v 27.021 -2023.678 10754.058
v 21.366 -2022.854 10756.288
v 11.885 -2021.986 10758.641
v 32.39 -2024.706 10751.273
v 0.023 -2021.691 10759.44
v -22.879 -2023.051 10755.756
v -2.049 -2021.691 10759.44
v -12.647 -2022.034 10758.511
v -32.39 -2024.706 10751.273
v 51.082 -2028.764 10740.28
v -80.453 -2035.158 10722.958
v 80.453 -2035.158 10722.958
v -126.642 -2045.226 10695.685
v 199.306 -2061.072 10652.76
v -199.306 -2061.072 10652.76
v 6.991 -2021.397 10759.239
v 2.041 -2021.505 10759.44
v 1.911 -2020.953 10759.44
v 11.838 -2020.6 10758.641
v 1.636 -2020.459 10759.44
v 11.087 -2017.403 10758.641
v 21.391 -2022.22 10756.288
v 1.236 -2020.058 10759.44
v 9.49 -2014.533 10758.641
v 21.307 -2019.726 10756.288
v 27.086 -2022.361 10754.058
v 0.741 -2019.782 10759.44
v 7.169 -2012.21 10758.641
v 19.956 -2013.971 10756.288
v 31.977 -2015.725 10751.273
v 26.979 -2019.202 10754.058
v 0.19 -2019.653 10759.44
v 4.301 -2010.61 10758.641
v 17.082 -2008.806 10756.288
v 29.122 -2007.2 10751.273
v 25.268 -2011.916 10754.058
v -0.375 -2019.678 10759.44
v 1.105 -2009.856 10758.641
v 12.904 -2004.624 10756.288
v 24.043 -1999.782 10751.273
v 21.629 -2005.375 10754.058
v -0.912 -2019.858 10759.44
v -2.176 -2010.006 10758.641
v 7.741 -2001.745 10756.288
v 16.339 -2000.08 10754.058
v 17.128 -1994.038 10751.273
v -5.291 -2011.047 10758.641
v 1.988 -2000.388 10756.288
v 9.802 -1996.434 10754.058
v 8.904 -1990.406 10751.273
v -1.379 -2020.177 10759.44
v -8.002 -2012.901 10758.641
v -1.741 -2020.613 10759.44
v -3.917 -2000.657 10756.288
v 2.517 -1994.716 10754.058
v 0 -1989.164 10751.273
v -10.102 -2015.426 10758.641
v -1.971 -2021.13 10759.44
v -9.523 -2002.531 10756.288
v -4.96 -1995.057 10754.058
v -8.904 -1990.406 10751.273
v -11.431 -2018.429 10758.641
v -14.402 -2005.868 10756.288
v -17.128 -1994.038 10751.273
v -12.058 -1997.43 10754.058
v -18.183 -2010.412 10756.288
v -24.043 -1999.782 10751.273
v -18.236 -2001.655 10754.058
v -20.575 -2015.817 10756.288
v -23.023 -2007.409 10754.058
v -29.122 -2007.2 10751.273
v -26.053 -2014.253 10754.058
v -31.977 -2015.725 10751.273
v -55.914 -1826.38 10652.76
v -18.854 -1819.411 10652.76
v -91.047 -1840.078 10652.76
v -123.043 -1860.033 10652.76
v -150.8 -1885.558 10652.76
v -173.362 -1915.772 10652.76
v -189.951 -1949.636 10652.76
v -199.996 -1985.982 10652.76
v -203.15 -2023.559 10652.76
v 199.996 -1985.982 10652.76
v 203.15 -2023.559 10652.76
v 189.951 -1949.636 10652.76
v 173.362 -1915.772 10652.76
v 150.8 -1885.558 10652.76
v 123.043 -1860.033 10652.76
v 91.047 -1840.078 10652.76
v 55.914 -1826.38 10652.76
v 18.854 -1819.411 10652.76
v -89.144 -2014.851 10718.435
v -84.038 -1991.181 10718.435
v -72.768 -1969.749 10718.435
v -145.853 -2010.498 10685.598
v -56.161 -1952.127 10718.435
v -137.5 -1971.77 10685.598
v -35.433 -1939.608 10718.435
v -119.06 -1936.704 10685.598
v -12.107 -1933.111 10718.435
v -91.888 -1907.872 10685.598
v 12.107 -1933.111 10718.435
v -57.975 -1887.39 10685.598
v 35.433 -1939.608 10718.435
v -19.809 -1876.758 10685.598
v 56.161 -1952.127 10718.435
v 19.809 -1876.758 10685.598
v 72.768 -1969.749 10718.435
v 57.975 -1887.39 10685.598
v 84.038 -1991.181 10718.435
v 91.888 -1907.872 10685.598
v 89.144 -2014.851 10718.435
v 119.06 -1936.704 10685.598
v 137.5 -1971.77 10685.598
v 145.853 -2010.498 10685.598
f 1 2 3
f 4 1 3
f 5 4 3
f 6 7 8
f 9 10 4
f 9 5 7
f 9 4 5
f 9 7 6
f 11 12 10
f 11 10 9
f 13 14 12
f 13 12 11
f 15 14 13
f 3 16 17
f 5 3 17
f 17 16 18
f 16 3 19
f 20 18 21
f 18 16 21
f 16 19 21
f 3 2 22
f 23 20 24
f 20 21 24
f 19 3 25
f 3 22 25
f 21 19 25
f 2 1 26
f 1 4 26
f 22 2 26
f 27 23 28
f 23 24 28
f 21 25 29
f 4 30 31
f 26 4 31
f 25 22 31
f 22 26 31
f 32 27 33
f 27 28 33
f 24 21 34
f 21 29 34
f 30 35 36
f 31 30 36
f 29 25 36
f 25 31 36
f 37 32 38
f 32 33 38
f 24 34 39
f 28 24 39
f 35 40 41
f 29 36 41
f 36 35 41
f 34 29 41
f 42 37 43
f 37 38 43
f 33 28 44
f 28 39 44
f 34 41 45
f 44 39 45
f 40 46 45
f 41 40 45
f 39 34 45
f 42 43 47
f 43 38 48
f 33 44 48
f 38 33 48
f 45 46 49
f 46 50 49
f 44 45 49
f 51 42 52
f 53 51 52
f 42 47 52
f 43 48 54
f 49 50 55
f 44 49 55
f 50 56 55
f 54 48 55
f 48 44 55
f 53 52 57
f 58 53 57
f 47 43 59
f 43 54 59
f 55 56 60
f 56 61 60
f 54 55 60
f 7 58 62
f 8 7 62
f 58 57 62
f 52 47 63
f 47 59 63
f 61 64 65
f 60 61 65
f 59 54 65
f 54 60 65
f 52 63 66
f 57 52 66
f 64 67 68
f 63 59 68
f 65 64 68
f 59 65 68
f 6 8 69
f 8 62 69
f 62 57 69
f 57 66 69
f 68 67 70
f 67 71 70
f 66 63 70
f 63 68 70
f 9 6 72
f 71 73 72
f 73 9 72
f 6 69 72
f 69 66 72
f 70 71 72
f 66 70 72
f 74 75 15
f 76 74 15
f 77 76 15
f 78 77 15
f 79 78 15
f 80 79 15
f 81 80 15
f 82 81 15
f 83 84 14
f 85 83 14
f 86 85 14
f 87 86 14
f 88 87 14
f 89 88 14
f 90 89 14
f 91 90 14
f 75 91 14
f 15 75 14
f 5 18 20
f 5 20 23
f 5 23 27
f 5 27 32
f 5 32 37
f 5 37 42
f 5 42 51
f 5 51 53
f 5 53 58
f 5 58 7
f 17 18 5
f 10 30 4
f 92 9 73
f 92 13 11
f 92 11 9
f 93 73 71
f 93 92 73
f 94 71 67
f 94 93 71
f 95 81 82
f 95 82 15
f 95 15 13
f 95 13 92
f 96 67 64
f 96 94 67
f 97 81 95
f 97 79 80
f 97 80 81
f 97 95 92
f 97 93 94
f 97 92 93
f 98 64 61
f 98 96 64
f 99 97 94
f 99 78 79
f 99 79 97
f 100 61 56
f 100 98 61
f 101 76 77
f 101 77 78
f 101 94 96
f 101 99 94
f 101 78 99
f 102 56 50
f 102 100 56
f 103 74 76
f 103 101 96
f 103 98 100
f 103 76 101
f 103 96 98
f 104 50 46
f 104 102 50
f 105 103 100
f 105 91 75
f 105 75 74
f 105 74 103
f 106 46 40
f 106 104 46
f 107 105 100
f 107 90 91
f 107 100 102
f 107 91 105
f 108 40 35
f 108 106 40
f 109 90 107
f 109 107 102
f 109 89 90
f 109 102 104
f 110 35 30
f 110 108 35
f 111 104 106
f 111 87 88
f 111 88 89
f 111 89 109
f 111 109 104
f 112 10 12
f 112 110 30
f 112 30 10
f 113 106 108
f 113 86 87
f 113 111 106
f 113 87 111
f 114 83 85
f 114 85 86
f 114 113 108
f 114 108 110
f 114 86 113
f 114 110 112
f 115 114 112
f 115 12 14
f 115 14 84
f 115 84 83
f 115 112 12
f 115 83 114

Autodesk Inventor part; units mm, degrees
ref_plane "YZ Plane" through (0, 0, 0) normal (1, 0, 0) x (0, 1, 0)
ref_plane "Work Plane8" through (0, -1837.3344, 10759.44) normal (0, 0, 1) x (-0.6391035, -0.7691208, 0)
sketch "Sketch14" plane through (0, -1837.3344, 10759.44) normal (0, 0, 1) x (-0.6391035, -0.7691208, 0)
  arc A0 (51.9231, 278.7941) -> (283.588, 0) centre (141.794, 117.8242) ccw projected
  arc A1 (128.7949, 130.8233) -> (154.7931, 104.8251) centre (141.794, 117.8242) ccw
  line L0 (141.794, 117.8242) -> (128.7949, 130.8233)
  line L1 (128.7949, 130.8233) -> (154.7931, 104.8251)
  point P0 (-1413.132, -1174.2468)
extrude "Extrusion9" add sketch "Sketch14" against normal blind 106.68 draft 60
ref_plane "Work Plane9" through (0, -2021.693, 10759.44) normal (0, -0.9381218, 0.3463054) x (-0.8718495, -0.1696114, -0.4594676)
sketch "Sketch15" plane through (0, -2021.693, 10759.44) normal (0, -0.9381218, 0.3463054) x (-0.8718495, -0.1696114, -0.4594676)
  line L0 (-172.5198, -77.543) -> (270.8607, -77.543)
  line L1 (270.8607, -77.543) -> (270.8607, 243.8061)
  line L2 (270.8607, 243.8061) -> (-172.5198, 243.8061)
  line L3 (-172.5198, 243.8061) -> (-172.5198, -77.543)
  point P0 (4600.712, 8189.7549)
extrude "Extrusion10" cut sketch "Sketch15" along normal blind 304.8
fillet "Fillet5" radius 60.96 1 edges at (-0.8449, -2003.3289, 10759.44)
properties part number "nose" material "Steel, Mild"
